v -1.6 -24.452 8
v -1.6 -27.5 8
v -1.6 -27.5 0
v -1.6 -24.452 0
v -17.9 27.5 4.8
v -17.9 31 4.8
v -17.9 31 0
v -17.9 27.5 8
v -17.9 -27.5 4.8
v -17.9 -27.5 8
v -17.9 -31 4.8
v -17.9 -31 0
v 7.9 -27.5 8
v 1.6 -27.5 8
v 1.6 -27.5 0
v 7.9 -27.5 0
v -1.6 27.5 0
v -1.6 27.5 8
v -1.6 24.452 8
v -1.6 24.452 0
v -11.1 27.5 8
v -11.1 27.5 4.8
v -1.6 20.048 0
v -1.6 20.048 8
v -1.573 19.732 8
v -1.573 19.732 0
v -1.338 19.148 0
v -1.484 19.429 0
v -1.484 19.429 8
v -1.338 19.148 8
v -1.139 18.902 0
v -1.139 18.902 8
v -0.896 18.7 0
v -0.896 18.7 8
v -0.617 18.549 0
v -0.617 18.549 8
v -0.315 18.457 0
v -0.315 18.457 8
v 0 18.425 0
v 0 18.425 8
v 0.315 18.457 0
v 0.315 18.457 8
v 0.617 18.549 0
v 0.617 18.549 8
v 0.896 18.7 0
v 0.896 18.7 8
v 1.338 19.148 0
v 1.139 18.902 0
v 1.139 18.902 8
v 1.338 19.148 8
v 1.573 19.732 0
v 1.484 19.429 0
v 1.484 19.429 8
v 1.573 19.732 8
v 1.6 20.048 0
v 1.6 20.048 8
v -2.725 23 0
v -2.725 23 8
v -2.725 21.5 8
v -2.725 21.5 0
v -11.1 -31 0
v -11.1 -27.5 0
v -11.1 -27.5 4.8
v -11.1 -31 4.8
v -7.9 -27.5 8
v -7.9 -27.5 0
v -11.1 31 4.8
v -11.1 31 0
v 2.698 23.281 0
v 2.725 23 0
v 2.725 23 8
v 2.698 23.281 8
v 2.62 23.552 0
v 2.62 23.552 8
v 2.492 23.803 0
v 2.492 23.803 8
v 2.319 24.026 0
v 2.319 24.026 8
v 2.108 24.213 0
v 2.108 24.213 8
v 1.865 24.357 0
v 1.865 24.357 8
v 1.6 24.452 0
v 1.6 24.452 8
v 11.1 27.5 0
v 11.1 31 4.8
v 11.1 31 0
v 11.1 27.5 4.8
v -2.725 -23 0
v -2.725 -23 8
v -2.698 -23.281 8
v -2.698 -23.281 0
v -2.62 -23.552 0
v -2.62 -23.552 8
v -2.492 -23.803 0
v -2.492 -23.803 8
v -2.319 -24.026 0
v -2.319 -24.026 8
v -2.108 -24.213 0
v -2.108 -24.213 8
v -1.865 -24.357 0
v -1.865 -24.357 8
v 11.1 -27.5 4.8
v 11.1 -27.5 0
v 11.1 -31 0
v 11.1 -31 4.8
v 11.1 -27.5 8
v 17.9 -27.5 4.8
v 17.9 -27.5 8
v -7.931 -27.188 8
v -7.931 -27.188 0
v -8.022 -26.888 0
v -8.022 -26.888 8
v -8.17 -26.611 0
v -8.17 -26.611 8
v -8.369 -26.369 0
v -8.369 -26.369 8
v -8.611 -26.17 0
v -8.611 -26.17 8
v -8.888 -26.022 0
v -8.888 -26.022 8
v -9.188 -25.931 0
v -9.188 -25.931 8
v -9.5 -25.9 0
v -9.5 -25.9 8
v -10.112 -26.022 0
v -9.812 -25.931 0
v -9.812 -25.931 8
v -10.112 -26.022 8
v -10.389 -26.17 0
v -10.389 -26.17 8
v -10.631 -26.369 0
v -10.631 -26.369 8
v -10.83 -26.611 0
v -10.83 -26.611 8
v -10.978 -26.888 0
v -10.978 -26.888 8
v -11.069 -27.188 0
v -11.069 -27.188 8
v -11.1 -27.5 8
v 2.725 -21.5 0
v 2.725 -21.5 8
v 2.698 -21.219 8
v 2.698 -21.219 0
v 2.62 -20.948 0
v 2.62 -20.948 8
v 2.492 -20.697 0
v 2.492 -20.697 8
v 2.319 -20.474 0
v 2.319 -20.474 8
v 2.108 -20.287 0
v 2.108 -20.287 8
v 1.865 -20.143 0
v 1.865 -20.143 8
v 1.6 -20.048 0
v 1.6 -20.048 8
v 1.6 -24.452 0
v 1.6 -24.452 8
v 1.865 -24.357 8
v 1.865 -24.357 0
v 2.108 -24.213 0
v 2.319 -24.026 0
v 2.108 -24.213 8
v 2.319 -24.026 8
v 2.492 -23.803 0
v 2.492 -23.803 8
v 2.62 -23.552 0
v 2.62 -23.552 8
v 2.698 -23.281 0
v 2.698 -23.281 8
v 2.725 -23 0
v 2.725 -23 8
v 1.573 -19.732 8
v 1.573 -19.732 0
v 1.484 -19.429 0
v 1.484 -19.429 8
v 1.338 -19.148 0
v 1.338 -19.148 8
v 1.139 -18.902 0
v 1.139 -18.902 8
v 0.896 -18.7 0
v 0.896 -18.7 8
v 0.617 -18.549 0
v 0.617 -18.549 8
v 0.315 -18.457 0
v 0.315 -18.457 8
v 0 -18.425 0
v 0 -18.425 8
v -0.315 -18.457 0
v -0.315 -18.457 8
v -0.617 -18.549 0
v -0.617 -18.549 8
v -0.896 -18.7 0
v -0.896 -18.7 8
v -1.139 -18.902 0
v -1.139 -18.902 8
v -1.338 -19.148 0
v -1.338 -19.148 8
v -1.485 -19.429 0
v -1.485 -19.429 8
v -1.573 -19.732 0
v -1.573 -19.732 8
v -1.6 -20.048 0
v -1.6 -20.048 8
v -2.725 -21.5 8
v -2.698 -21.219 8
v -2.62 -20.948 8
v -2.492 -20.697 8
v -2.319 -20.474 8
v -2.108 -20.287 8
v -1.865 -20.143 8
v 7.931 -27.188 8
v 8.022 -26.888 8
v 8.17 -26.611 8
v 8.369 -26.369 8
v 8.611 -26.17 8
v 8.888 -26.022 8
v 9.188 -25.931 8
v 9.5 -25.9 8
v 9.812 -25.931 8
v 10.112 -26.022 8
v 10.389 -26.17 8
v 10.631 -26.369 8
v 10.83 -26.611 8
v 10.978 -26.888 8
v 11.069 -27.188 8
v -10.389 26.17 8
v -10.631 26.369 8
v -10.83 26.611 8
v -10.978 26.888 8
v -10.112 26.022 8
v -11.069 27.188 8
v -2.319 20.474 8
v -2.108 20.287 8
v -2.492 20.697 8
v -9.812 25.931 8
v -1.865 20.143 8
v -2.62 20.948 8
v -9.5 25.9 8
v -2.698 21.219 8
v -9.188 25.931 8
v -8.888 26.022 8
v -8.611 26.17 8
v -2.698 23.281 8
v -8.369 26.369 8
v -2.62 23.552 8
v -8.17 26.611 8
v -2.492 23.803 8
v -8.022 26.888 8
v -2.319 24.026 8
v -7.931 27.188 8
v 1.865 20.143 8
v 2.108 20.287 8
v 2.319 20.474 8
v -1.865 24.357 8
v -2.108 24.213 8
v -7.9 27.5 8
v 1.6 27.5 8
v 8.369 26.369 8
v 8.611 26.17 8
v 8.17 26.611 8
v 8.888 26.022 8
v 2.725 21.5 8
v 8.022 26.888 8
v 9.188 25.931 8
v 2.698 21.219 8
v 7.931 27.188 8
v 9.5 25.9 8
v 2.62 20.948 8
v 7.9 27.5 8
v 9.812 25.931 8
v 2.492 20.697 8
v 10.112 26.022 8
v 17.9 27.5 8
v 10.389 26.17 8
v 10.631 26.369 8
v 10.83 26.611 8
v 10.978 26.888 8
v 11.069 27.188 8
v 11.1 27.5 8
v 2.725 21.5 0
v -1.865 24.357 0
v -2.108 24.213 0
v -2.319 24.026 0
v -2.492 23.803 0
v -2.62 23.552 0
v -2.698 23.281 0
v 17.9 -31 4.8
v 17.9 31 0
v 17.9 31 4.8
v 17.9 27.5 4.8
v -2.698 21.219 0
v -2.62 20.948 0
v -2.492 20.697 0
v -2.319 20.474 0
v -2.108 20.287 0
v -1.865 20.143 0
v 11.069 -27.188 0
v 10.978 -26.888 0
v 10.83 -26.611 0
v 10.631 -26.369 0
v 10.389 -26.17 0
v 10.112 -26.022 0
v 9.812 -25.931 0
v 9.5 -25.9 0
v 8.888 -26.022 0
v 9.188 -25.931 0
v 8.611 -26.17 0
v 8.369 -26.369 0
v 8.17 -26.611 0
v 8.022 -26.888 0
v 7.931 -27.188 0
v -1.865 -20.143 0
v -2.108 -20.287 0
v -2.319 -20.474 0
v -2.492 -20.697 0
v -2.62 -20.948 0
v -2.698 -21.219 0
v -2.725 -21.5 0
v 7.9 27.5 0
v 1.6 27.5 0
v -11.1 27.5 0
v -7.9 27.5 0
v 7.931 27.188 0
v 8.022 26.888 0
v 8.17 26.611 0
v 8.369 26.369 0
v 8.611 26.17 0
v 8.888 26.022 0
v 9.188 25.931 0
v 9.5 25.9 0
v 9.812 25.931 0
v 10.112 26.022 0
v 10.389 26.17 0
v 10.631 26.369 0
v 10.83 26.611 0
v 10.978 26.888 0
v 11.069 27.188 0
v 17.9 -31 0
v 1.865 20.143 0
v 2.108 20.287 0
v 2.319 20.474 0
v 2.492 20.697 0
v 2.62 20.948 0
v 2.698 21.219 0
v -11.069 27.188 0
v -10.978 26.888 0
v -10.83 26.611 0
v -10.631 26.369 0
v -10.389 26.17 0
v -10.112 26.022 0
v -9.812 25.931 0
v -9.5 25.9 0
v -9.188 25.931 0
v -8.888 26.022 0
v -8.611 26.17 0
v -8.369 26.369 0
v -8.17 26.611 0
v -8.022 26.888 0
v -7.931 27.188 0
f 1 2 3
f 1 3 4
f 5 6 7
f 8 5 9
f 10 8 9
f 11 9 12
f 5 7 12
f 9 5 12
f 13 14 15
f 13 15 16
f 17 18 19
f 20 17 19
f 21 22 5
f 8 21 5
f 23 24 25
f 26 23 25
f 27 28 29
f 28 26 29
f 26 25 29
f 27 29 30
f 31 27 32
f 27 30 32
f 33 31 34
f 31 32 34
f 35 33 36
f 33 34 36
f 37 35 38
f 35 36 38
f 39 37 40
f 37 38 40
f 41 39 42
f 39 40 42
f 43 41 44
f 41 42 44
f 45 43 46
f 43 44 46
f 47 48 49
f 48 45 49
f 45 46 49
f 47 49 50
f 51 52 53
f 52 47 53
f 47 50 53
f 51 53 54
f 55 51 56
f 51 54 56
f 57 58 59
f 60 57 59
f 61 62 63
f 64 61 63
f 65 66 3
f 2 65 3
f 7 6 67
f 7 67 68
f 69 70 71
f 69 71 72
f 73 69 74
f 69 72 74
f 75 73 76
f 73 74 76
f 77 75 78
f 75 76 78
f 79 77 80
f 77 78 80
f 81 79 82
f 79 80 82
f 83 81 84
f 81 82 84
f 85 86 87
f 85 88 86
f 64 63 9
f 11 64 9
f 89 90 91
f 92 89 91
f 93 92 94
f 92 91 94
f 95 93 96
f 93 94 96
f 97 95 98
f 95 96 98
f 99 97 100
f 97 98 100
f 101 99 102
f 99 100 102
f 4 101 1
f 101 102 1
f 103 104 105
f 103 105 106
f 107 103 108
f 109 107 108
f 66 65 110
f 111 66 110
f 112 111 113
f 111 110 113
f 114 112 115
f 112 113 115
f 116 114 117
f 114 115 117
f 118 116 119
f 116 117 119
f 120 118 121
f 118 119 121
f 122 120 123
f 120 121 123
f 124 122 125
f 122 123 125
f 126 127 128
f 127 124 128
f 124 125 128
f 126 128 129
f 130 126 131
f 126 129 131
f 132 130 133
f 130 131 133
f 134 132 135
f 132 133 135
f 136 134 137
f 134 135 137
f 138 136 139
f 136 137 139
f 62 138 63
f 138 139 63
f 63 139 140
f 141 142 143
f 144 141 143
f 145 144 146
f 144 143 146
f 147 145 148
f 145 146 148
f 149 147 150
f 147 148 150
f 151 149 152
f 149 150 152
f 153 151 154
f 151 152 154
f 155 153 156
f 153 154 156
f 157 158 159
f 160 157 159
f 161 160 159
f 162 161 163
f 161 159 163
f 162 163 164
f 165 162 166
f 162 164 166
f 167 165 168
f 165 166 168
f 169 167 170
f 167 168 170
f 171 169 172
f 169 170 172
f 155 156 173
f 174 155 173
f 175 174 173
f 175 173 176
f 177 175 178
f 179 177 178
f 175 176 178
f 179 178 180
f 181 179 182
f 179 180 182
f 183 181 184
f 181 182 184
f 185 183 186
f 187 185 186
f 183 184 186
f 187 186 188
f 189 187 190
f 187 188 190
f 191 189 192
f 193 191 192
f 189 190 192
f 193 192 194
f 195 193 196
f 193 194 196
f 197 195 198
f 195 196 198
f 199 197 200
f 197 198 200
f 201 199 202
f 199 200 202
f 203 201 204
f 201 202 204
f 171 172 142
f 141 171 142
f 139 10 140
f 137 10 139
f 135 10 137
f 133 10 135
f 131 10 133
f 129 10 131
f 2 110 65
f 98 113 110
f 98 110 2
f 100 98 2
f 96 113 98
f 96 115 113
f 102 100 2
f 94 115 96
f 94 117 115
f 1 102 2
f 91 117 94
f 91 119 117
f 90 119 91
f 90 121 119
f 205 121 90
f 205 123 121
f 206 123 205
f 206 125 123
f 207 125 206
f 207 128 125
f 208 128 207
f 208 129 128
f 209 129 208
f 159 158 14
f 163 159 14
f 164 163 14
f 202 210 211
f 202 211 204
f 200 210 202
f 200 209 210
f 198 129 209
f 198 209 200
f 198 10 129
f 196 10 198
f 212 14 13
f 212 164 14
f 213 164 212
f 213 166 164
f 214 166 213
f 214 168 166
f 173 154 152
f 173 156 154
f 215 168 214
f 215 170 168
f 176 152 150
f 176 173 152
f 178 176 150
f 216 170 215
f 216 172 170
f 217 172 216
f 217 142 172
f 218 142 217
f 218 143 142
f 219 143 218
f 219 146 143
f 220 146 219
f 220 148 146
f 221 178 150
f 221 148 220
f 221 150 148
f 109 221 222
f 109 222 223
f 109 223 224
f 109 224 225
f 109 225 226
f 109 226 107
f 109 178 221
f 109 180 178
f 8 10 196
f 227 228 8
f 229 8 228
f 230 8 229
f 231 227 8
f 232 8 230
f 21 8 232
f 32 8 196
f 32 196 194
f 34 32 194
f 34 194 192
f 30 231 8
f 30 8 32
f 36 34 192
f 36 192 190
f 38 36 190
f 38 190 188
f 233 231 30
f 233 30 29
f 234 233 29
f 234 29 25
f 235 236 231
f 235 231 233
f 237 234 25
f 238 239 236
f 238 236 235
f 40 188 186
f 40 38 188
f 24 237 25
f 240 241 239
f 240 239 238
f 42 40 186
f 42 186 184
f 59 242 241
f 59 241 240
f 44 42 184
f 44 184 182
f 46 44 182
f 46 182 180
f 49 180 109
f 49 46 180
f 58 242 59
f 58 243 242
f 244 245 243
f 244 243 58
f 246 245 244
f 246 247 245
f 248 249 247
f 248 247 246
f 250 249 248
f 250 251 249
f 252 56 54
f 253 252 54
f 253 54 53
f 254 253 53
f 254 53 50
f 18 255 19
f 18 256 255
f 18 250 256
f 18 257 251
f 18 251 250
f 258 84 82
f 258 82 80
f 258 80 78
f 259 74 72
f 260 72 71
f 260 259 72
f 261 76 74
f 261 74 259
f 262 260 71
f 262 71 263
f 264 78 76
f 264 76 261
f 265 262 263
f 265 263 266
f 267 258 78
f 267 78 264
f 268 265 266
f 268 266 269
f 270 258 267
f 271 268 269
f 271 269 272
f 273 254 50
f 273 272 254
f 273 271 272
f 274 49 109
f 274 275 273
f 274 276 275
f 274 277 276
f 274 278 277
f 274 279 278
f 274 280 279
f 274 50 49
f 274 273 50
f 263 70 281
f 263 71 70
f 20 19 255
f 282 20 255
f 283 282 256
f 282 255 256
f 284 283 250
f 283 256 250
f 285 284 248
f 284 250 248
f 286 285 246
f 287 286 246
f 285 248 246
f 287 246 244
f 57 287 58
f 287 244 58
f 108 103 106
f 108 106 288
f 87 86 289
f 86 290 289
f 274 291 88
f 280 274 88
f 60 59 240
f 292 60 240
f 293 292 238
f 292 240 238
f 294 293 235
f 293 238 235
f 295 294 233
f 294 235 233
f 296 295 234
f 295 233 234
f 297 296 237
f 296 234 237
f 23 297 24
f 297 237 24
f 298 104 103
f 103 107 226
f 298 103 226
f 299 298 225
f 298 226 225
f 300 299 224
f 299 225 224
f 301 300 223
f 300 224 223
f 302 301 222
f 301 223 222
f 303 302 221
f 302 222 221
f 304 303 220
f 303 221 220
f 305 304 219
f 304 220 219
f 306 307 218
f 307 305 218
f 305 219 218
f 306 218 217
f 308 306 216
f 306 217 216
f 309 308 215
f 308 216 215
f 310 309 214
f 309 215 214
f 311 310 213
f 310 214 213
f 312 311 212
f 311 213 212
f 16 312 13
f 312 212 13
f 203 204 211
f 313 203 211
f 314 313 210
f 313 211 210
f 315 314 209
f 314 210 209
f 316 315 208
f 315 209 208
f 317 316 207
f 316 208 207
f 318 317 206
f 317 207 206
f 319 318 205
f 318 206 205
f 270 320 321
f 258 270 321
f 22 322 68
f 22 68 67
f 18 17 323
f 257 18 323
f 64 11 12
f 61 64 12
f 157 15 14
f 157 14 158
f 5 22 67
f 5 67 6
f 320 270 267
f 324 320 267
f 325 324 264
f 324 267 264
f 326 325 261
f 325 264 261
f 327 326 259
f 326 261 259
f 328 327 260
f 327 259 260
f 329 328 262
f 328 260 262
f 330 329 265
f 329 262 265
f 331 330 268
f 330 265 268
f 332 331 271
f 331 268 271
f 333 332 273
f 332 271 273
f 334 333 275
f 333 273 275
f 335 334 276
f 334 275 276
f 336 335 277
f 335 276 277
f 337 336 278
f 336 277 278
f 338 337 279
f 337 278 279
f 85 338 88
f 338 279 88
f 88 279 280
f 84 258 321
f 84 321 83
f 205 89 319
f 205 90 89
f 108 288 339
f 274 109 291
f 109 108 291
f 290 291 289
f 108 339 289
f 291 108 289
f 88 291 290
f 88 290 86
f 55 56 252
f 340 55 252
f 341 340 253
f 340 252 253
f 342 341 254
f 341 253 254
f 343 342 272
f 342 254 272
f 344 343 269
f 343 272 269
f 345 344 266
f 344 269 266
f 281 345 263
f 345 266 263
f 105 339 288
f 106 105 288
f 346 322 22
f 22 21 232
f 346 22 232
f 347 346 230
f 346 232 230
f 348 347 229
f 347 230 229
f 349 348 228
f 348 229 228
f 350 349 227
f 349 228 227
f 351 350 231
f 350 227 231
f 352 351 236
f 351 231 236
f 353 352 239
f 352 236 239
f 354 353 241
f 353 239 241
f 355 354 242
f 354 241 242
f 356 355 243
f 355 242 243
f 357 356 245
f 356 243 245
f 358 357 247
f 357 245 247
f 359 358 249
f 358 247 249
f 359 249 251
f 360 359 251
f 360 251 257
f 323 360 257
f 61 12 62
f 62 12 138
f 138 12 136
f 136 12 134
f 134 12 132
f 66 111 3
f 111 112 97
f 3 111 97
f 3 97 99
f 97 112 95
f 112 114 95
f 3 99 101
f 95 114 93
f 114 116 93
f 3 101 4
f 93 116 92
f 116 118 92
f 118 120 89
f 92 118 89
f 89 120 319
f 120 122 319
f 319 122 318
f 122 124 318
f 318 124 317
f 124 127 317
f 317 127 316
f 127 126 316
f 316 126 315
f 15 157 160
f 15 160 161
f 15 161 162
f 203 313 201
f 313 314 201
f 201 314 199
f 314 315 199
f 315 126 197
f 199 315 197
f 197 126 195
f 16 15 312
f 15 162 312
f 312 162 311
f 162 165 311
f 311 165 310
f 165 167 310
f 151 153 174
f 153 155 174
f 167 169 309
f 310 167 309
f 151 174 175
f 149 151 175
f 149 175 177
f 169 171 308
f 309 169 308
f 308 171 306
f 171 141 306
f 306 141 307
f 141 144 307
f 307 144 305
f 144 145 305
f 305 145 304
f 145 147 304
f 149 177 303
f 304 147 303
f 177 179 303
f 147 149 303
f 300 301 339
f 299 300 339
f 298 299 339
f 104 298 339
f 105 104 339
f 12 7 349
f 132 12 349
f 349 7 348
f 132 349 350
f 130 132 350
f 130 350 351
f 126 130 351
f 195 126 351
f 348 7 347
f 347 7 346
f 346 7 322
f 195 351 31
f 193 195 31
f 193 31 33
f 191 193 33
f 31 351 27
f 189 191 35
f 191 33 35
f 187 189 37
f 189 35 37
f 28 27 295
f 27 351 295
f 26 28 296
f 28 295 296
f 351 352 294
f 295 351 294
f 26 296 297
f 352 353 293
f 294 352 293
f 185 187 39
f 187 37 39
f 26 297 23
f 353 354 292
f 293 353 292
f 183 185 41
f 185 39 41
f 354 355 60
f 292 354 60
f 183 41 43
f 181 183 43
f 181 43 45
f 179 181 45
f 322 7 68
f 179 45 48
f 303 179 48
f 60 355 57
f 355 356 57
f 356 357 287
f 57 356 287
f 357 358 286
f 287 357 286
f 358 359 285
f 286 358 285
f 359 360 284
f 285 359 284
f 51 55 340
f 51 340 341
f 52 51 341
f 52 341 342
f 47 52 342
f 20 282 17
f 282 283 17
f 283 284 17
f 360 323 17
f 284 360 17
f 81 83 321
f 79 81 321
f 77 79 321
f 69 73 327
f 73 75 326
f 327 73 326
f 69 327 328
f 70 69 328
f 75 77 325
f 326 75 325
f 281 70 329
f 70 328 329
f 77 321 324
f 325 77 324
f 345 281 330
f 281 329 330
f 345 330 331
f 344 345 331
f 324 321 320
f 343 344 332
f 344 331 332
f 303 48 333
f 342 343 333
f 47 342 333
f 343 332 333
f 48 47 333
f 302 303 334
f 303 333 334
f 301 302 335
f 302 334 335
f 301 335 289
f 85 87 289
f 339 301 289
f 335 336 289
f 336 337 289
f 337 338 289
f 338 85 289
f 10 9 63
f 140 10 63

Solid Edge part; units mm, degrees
sketch "Sketch1" plane through (0, 0, 0) normal (0, 0, 1) x (1, 0, 0)
  line L0 (-17.9, -27.5) -> (17.9, -27.5)
  line L1 (17.9, -27.5) -> (17.9, 27.5)
  line L2 (17.9, 27.5) -> (-17.9, 27.5)
  line L3 (-17.9, 27.5) -> (-17.9, -27.5)
extrude "Protrusion1" add sketch "Sketch1" along normal blind 8
sketch "Sketch2" plane through (0, -27.5, 4) normal (0, -1, 0) x (1, 0, 0)
  line L0 (-11.1, 0.8) -> (-17.9, 0.8)
  line L1 (-17.9, 0.8) -> (-17.9, -4)
  line L2 (-17.9, -4) -> (-11.1, -4)
  line L3 (-11.1, -4) -> (-11.1, 0.8)
  line L4 (11.1, 0.8) -> (17.9, 0.8)
  line L5 (17.9, 0.8) -> (17.9, -4)
  line L6 (17.9, -4) -> (11.1, -4)
  line L7 (11.1, -4) -> (11.1, 0.8)
extrude "ExtrudedProtrusion_2" add sketch "Sketch2" along normal blind 3.5
sketch "Sketch3" plane through (0, 27.5, 4) normal (0, 1, 0) x (-1, 0, 0)
  line L0 (-17.9, 0.8) -> (-11.1, 0.8)
  line L1 (-11.1, 0.8) -> (-11.1, -4)
  line L2 (-11.1, -4) -> (-17.9, -4)
  line L3 (-17.9, -4) -> (-17.9, 0.8)
  line L4 (11.1, 0.8) -> (17.9, 0.8)
  line L5 (17.9, 0.8) -> (17.9, -4)
  line L6 (17.9, -4) -> (11.1, -4)
  line L7 (11.1, -4) -> (11.1, 0.8)
extrude "ExtrudedProtrusion_3" add sketch "Sketch3" along normal blind 3.5
sketch "Sketch4" plane through (0, 0, 8) normal (0, 0, 1) x (-1, 0, 0)
  line L0 (1.5998, -27.5) -> (1.5998, -24.4524)
  arc A0 (1.5998, -24.4524) -> (2.725, -23) centre (1.225, -23) ccw
  line L1 (2.725, -23) -> (2.725, -21.5)
  arc A1 (2.725, -21.5) -> (1.5998, -20.0476) centre (1.225, -21.5) ccw
  arc A2 (-2.725, -21.5) -> (-1.5998, -20.0476) centre (-1.225, -21.5) cw
  line L2 (-2.725, -23) -> (-2.725, -21.5)
  arc A3 (-1.6, -24.4524) -> (-2.725, -23) centre (-1.225, -23) cw
  line L3 (-1.6, -27.5) -> (-1.6, -24.4524)
  line L4 (0, -27.5) -> (-1.6, -27.5)
  line L5 (0, -27.5) -> (1.5998, -27.5)
  arc A4 (-1.5998, -20.0476) -> (1.5998, -20.0476) centre (0, -20.0254) cw
extrude "ExtrudedCutout_1" cut sketch "Sketch4" against normal blind 8
sketch "Sketch5" plane through (0, 0, 8) normal (0, 0, 1) x (-1, 0, 0)
  line L0 (11.1, 27.5) -> (7.9, 27.5)
  arc A0 (11.1, 27.5) -> (7.9, 27.5) centre (9.5, 27.5) cw
  line L1 (-11.1, 27.5) -> (-7.9, 27.5)
  arc A1 (-7.9, 27.5) -> (-11.1, 27.5) centre (-9.5, 27.5) cw
  arc A2 (-7.9, -27.5) -> (-11.1, -27.5) centre (-9.5, -27.5) ccw
  line L2 (-11.1, -27.5) -> (-7.9, -27.5)
  arc A3 (11.1, -27.5) -> (7.9, -27.5) centre (9.5, -27.5) ccw
  line L3 (11.1, -27.5) -> (7.9, -27.5)
extrude "ExtrudedCutout_2" cut sketch "Sketch5" against normal blind 8
sketch "Sketch6" plane through (0, 0, 8) normal (0, 0, 1) x (-1, 0, 0)
  arc A0 (-1.6, 24.4524) -> (-2.725, 23) centre (-1.225, 23) ccw
  line L0 (-2.725, 23) -> (-2.725, 21.5)
  arc A1 (-2.725, 21.5) -> (-1.5998, 20.0476) centre (-1.225, 21.5) ccw
  arc A2 (-1.5998, 20.0476) -> (1.5998, 20.0476) centre (0, 20.0254) ccw
  arc A3 (2.725, 21.5) -> (1.5998, 20.0476) centre (1.225, 21.5) cw
  line L1 (2.725, 23) -> (2.725, 21.5)
  arc A4 (1.5998, 24.4524) -> (2.725, 23) centre (1.225, 23) cw
  line L2 (1.5998, 27.5) -> (1.5998, 24.4524)
  line L3 (0, 27.5) -> (1.5998, 27.5)
  line L4 (0, 27.5) -> (-1.6, 27.5)
  line L5 (-1.6, 27.5) -> (-1.6, 24.4524)
extrude "Cutout1" cut sketch "Sketch6" against normal up to next
properties material "Polycarbonate"
